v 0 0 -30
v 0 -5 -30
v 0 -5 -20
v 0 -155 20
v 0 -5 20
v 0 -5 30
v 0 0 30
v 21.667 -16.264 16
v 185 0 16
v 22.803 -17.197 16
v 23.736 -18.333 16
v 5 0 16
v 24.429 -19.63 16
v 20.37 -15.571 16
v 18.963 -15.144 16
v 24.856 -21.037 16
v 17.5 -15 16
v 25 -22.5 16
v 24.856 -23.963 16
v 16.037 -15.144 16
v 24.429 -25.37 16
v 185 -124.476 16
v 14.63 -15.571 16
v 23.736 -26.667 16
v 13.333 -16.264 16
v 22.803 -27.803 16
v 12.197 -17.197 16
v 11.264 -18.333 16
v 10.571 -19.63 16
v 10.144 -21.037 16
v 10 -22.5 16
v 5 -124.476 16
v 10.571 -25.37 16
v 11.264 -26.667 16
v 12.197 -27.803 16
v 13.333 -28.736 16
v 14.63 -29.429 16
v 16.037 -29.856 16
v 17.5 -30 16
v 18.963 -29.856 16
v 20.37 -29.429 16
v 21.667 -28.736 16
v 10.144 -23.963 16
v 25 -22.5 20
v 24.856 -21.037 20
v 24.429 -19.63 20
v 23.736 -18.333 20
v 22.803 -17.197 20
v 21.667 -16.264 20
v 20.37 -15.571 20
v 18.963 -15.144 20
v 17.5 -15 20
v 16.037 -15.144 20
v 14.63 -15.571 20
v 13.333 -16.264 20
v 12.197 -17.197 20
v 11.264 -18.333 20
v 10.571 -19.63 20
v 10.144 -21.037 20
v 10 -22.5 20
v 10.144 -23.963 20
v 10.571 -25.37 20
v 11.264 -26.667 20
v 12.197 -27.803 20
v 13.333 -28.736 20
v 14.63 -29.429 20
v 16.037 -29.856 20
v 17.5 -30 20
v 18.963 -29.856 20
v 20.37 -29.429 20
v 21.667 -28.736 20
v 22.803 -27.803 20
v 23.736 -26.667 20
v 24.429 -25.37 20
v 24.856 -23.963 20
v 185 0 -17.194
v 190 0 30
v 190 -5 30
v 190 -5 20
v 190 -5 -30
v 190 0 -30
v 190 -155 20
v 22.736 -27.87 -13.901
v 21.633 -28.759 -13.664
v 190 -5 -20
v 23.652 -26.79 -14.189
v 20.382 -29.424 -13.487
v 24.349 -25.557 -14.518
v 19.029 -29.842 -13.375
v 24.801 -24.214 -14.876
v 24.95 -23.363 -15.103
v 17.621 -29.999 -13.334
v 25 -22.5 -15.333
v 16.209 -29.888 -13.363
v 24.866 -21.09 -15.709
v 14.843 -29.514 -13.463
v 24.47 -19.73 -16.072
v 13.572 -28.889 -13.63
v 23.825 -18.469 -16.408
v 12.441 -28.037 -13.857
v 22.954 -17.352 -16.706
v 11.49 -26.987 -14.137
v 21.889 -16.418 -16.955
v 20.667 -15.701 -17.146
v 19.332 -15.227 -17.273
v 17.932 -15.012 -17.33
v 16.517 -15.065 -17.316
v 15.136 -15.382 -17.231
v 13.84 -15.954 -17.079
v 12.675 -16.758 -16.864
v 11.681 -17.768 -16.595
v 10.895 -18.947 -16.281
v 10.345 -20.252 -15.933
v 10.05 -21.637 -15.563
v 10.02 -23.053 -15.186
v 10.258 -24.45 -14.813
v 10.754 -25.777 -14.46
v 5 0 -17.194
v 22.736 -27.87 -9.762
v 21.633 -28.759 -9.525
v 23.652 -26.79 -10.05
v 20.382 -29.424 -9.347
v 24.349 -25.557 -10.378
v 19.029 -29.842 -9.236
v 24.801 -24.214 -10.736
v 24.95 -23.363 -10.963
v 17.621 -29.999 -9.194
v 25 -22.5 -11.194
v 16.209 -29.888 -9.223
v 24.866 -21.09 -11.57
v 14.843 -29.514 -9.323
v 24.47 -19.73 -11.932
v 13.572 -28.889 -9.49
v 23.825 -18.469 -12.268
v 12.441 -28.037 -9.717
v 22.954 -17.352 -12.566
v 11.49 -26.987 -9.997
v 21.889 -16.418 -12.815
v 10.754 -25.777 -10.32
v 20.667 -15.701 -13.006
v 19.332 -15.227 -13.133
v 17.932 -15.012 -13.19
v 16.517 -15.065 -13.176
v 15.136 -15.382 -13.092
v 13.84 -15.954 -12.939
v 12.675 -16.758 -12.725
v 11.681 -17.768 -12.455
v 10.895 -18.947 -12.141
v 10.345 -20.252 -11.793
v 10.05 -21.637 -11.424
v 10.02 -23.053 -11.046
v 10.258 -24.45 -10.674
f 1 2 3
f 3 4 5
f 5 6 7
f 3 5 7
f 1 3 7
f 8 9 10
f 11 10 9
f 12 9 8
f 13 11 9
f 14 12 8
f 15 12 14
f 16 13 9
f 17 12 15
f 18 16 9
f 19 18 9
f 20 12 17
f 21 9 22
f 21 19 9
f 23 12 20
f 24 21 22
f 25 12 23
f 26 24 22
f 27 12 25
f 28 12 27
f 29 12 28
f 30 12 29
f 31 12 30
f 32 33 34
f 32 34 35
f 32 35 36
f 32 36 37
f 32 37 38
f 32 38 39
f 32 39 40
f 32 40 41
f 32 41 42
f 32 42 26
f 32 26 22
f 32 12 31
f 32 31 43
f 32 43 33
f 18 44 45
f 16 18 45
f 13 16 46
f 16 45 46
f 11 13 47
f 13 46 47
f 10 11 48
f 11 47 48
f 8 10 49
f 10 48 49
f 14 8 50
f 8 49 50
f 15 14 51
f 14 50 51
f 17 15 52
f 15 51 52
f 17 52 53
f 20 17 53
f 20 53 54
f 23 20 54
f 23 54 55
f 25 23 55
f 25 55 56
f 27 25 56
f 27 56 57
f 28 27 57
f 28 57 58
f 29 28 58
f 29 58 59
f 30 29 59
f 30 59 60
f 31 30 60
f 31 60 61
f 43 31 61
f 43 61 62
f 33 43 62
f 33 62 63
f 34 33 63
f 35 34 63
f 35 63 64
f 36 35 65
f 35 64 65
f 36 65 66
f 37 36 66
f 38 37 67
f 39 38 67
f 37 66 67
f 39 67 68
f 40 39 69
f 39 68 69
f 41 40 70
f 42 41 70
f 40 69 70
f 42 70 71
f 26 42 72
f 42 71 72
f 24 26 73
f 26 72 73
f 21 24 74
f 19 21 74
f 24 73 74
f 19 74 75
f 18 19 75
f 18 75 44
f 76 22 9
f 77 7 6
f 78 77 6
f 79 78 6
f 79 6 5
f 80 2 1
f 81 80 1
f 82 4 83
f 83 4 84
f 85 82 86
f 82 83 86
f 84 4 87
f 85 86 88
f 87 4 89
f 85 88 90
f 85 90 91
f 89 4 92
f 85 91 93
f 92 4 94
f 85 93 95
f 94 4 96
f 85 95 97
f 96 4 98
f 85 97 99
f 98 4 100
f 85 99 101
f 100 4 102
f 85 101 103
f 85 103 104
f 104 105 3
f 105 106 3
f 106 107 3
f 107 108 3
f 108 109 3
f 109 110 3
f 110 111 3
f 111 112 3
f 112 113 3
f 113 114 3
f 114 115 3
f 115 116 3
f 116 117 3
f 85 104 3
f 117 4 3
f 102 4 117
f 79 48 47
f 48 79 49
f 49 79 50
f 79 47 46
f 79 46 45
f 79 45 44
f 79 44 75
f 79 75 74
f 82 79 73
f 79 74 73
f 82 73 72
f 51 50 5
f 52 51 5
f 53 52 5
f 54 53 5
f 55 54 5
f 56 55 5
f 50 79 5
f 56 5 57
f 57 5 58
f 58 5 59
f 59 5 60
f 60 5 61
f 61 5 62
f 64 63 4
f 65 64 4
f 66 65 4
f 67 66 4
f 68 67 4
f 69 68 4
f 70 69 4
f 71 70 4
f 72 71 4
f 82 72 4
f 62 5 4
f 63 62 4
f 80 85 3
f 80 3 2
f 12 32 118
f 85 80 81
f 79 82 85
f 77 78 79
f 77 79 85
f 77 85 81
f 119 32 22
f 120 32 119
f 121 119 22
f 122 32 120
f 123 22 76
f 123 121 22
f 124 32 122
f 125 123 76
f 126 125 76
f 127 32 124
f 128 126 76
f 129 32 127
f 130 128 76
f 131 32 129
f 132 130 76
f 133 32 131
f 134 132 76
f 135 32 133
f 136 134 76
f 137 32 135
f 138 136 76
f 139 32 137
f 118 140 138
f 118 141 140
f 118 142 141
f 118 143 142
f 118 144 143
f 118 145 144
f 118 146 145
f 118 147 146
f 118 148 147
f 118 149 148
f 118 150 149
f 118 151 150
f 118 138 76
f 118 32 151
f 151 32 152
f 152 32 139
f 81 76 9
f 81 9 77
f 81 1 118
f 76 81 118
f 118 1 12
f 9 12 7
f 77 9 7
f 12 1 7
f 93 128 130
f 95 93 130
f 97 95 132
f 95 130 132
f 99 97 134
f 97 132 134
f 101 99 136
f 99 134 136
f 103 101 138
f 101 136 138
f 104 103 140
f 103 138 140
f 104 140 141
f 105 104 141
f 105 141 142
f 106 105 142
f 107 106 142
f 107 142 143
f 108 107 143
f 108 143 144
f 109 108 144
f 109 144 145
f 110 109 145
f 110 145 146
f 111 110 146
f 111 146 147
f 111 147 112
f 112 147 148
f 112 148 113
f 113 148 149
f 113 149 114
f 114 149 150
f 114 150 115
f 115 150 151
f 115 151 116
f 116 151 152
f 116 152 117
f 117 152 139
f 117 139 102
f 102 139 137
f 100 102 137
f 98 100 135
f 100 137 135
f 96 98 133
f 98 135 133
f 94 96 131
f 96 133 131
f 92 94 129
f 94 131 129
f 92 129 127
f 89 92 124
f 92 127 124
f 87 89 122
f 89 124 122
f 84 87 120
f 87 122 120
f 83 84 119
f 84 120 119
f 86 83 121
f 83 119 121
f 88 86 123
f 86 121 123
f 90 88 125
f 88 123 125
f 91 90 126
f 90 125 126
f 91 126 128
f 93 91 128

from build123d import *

# Parameters (mm, degrees)
PAD001_DEPTH = 180
PAD_DEPTH    = 190
SKETCH002_R  = 7.5
POCKET_DEPTH = 50.001


with BuildPart() as pad_02_triangulo_interno:
    # Sketch001 → Pad001 (new body)
    with BuildSketch(Plane.YZ.offset(5)):
        Polygon((10, 16), (-124.475825, 16), (10, -19.86022), align=None)
    extrude(amount=PAD001_DEPTH)


with BuildPart() as pocket_01_buracos_grandes:
    # Sketch → Pad (new body)
    with BuildSketch(Plane.YZ):
        Polygon((-5, -30), (0, -30), (0, 30), (-5, 30), (-5, 20), (-155, 20), (-5, -20), align=None)
    extrude(amount=PAD_DEPTH)

    # Cut: cut Pad 02 - Triangulo Interno
    add(pad_02_triangulo_interno.part, mode=Mode.SUBTRACT)

    # Sketch002 → Pocket (cut, through all)
    with BuildSketch(Plane.XY.offset(20)):
        with Locations((17.5, -22.5)):
            Circle(SKETCH002_R)
    extrude(amount=-POCKET_DEPTH, mode=Mode.SUBTRACT)


solid = pocket_01_buracos_grandes.part
